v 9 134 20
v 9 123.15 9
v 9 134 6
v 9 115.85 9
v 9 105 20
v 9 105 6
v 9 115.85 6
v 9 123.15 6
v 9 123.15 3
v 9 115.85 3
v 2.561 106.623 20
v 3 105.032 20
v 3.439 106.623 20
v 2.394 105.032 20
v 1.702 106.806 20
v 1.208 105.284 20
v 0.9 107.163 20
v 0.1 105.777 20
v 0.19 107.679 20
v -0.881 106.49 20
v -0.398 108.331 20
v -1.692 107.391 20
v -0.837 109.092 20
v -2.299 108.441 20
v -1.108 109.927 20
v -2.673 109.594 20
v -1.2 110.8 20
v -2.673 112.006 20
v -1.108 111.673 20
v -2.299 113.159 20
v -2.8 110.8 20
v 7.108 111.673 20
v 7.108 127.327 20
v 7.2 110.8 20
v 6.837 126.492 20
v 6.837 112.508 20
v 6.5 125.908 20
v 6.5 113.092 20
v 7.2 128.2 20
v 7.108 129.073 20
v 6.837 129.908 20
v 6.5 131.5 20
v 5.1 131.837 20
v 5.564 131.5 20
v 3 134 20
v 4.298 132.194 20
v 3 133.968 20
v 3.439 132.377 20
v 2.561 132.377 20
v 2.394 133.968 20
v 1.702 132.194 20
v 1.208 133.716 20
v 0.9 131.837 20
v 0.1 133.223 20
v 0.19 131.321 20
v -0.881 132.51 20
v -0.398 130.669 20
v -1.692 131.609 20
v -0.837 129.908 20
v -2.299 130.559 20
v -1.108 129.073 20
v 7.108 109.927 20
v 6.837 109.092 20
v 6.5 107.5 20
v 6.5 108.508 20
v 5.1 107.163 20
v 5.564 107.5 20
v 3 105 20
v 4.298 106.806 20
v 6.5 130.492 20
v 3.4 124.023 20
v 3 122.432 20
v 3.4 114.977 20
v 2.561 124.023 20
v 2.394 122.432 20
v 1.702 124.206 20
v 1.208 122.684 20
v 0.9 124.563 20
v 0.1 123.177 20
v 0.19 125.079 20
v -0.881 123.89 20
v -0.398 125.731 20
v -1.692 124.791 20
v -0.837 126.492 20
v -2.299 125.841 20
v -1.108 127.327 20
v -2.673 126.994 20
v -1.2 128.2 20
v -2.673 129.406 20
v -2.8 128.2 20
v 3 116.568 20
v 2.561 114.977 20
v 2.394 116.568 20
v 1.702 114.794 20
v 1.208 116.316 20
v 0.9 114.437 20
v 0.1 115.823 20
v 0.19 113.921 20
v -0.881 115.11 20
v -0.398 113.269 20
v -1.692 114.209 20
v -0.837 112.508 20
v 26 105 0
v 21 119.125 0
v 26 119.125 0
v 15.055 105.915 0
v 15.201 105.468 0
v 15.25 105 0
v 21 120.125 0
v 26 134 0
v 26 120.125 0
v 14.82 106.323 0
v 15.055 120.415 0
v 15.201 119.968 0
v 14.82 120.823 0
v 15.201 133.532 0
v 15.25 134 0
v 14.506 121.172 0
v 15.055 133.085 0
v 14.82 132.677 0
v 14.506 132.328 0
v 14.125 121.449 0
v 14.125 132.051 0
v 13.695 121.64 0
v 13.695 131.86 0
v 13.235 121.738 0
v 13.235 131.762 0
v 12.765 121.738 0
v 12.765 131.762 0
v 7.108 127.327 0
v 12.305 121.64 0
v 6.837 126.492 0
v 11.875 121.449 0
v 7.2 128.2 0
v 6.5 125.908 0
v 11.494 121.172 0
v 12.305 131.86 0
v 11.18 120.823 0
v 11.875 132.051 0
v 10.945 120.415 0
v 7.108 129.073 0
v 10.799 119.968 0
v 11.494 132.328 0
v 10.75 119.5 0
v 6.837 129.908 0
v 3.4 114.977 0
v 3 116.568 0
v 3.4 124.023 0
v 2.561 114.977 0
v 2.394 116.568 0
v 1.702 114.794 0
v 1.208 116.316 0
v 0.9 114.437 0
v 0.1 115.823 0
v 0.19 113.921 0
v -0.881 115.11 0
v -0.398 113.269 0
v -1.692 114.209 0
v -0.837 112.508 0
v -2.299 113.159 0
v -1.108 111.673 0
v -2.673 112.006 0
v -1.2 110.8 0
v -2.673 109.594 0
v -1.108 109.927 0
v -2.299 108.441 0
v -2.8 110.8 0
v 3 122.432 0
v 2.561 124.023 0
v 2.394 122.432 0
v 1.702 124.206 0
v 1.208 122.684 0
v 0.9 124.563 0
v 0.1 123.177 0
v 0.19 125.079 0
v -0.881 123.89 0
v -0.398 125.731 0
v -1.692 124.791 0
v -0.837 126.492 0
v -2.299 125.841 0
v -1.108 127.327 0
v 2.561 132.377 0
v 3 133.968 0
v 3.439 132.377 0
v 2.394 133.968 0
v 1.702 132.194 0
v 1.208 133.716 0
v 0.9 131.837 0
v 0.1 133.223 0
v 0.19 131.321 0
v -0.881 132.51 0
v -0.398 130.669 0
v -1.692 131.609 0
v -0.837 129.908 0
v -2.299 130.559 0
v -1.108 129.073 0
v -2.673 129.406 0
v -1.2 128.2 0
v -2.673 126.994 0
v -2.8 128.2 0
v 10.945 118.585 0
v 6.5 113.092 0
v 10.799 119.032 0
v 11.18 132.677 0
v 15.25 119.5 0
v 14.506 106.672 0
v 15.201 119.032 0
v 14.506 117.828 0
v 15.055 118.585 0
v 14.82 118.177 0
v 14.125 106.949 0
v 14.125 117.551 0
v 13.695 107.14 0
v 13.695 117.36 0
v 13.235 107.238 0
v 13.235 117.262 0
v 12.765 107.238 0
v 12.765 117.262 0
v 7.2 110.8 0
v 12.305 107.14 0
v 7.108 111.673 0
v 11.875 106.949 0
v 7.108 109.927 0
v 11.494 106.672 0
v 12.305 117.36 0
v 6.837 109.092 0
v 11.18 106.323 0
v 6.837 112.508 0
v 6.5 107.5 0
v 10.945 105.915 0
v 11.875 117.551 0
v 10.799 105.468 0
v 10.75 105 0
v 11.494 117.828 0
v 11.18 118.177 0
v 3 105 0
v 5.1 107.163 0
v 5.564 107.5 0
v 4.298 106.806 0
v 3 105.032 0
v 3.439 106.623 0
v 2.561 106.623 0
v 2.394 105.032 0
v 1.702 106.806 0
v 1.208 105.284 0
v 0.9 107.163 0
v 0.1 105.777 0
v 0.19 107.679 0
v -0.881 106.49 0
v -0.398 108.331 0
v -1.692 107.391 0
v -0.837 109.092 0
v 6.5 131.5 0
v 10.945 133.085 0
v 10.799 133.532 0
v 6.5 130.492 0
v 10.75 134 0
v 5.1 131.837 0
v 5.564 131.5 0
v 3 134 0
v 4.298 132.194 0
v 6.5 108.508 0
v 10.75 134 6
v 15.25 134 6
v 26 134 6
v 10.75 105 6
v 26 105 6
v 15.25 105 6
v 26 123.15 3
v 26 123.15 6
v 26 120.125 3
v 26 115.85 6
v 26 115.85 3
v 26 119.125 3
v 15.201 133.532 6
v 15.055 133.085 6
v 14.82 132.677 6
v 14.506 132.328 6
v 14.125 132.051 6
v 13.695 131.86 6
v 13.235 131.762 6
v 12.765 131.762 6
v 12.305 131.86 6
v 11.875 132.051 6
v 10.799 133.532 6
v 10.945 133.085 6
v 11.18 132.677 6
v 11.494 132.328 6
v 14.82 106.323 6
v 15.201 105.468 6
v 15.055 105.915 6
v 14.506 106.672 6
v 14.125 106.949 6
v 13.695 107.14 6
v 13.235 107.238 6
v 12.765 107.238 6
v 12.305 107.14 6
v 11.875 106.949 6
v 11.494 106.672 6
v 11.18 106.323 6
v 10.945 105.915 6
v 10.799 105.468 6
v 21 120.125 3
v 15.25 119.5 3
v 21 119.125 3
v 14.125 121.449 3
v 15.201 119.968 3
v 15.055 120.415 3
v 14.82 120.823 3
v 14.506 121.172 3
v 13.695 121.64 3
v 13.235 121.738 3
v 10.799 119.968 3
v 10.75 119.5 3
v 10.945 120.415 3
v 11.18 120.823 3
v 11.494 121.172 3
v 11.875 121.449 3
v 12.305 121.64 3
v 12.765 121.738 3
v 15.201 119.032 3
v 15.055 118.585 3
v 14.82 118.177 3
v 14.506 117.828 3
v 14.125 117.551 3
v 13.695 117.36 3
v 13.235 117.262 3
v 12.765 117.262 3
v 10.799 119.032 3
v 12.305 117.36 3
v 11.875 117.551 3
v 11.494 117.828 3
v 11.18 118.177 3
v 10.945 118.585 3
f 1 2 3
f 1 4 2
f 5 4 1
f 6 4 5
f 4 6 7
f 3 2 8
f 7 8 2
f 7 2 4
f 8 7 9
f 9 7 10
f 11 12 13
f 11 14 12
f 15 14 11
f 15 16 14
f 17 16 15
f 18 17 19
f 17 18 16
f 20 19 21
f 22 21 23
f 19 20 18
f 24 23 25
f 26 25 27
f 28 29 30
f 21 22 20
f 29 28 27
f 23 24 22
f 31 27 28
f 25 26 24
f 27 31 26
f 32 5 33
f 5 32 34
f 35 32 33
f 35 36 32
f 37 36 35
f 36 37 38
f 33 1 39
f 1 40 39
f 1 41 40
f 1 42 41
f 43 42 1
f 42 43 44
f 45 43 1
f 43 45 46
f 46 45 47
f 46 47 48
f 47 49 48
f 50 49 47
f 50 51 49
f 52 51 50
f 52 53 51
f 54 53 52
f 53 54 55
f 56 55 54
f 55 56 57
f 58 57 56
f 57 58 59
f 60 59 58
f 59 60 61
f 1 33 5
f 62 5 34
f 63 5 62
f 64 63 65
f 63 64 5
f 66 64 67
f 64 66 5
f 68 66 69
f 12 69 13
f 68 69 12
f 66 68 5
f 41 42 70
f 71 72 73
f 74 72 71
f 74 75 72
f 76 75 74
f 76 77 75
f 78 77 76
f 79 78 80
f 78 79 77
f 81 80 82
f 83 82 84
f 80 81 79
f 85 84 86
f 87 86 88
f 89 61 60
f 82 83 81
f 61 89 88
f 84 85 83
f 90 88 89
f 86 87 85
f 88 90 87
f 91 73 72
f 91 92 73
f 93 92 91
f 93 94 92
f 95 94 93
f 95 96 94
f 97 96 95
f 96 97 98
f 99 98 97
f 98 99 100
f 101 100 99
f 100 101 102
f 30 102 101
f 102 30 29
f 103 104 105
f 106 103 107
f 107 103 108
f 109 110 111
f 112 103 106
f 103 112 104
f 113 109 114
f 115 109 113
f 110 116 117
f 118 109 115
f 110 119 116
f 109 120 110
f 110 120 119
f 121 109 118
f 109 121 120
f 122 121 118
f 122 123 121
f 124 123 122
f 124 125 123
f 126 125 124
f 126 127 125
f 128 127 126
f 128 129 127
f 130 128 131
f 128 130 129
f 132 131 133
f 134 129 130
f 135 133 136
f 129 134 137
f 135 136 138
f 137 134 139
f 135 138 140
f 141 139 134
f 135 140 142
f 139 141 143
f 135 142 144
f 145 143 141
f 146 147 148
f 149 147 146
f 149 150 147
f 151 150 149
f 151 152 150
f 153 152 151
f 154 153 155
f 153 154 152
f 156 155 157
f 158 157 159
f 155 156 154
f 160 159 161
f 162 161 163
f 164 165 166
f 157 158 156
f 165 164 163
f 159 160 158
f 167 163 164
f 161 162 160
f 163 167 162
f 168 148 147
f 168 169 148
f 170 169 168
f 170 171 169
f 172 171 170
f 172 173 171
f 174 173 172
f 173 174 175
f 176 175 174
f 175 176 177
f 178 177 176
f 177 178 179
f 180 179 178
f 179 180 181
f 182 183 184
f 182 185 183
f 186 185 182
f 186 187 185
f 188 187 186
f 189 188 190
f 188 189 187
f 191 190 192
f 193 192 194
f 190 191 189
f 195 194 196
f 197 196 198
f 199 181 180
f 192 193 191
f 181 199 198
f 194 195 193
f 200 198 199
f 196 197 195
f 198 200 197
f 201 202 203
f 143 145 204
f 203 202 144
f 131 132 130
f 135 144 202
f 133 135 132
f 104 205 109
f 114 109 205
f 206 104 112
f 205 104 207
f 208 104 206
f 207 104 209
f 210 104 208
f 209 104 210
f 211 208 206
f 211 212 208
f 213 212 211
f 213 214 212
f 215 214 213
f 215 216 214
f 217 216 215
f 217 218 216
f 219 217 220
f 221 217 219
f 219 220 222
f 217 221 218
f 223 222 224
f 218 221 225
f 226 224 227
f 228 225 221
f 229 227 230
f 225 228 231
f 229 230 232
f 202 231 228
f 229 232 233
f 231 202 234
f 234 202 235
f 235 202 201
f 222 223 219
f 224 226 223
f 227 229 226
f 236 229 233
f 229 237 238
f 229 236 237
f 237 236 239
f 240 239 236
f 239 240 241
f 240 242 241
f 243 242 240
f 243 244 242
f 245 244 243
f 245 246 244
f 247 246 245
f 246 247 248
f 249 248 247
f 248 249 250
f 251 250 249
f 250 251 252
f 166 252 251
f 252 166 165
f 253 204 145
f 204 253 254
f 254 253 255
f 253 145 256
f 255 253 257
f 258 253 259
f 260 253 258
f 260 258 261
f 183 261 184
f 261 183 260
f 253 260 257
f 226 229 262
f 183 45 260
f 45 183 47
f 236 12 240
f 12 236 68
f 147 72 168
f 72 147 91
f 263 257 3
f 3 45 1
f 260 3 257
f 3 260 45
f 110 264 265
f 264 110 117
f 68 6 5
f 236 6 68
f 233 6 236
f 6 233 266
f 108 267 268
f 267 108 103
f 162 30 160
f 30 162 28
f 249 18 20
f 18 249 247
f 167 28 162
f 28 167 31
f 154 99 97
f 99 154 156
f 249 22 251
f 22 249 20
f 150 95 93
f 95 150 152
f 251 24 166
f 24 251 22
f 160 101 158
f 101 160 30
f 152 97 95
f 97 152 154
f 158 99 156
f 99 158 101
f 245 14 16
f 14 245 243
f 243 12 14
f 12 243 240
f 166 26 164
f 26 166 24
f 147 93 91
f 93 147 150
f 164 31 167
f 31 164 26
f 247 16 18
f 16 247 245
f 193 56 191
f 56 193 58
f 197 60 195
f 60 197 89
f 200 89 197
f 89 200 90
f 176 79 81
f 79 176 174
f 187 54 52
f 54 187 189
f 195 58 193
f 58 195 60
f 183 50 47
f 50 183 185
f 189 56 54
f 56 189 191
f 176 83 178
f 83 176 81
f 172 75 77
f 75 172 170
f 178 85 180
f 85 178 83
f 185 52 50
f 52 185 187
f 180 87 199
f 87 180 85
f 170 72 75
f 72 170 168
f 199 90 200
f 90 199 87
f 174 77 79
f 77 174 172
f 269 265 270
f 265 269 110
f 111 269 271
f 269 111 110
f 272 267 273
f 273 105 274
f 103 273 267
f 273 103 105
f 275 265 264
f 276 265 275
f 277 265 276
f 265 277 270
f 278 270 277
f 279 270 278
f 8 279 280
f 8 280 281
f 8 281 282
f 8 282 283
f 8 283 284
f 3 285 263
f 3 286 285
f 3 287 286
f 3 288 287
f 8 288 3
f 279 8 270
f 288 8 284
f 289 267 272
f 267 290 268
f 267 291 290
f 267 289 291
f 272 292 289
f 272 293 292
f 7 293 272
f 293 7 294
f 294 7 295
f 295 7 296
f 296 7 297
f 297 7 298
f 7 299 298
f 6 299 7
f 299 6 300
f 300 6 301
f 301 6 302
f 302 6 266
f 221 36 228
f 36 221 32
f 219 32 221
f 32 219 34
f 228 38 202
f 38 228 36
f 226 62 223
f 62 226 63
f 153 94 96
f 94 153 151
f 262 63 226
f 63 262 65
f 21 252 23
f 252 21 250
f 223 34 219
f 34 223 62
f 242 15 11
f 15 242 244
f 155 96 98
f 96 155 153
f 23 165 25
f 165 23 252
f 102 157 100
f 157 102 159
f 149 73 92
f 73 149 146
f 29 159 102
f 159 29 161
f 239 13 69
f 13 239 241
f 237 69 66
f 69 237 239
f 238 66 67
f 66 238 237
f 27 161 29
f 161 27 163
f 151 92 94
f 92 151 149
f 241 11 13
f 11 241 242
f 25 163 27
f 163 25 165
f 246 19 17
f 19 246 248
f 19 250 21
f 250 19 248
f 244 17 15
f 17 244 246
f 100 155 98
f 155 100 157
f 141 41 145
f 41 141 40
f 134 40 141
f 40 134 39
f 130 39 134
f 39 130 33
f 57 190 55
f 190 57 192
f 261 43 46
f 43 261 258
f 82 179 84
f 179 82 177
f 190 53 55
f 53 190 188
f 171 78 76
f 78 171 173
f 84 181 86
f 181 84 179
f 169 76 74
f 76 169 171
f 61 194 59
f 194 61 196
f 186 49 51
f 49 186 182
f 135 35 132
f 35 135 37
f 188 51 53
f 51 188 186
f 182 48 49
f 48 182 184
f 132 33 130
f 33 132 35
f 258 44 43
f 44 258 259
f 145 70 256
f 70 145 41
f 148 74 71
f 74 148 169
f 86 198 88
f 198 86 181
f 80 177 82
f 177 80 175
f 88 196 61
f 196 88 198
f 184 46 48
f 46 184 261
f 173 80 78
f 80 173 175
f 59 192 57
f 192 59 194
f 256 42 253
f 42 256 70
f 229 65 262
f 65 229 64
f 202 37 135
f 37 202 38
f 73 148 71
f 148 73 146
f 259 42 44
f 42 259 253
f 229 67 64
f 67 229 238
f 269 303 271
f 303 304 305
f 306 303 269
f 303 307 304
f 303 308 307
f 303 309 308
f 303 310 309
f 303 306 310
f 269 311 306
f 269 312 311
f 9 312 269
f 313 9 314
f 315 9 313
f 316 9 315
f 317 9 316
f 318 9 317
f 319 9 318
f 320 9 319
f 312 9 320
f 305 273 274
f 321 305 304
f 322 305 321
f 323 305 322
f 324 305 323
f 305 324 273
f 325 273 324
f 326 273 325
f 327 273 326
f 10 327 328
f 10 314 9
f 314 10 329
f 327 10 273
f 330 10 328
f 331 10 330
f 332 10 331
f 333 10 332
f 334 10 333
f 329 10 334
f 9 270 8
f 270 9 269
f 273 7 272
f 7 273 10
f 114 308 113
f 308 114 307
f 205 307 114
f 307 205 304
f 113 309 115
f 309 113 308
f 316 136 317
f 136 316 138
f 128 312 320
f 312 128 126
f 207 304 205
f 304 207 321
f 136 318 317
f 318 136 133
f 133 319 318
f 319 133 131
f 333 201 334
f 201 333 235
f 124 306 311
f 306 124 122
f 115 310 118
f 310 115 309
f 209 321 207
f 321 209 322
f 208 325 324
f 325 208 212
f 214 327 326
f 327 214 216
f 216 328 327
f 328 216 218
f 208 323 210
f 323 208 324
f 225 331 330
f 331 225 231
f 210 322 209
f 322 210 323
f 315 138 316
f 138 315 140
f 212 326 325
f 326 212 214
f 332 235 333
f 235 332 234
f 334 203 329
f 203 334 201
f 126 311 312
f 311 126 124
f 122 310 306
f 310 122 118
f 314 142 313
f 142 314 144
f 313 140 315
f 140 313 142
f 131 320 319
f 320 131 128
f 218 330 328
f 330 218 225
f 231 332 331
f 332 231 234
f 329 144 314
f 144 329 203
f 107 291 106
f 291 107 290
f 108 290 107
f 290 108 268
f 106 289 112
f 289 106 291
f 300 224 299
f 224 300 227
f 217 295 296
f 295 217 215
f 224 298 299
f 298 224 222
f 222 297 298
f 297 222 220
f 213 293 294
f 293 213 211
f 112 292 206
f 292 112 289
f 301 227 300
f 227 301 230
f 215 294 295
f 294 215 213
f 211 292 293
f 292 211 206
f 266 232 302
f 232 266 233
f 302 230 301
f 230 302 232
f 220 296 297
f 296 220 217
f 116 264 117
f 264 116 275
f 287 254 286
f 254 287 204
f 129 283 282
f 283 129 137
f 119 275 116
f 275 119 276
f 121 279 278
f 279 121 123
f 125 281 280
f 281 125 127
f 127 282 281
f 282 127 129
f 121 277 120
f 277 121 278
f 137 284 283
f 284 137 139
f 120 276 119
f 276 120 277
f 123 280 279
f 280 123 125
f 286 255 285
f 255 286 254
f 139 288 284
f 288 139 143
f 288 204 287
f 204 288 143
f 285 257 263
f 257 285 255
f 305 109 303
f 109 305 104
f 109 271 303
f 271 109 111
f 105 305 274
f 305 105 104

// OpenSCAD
a = 6; // Gap between bars
b = 20; // width of the bars
c = 29; // Width of whole thing
e = 3; // Outside wall thickness, and 45 degree area width
f = 160; // length of bar this must be in center of
g = 4; // Slot width for cable tie
h = 20; // Slide length
i = 4.5; // Screw hole diameter
j = 6.8; // Nut width
k = 0.5; // Slot for line
d = c-e-e; // Width of slot
m = 300; // Long distance for cutouts
n = 1; // Extra bit so cutouts go through without rendering
o = 1.6; // Thickness of cylinder springs for slider

t = 0.25; // tolerance

bar = [b+t+t, c, b+t];
l = e+t+b+t+f/2-(a/2+t+b+t+e);

$fs=0.02;

//pivot();
//translate([0, 35, 0]) adjuster();
//translate([0, 70, 0]) anchor();
translate([0, 105, 0]) slider();
//translate([0, 0, 0]) bar_support();


module pivot () {
    difference() {
        // Main block
        cube([e+t+b+t+a+t+b+t+e, c, b/2+e]);
        // Slots for bars to fit in
        translate([e, 0, e]) cube(bar);
        translate([e+t+b+t+a, 0, e]) cube(bar);
        // Cutout for free-hanging line
        translate([e+t+b+t, (c-d)/2, e]) cube([a, d, b]);
        // slot for line to go through
        translate([e+t+b+t, (c-d)/2, 0]) cube([a/2, d, b]);
        translate([e+t+b+t+a/2, (c-d)/2, e]) rotate([0,135,0]) cube([b, e, b+t+e]);
        translate([e+t+b+t+a/2, (c-d)/2+d-e, e]) rotate([0,135,0]) cube([b, e, b+t+e]);
        // Cable tie slot
        translate([0,(c-g)/2,-n]) cube([g/2, g, m]);
        // Slot to fit adjustment strip
        translate([e+t+b+t+a+t+b+t+e,c/2,0]) {
            translate([-e,-1.5*e-t,-n]) cube([e,t+3*e+t,m]);
            translate([-e-t-e-t,-2.5*e-t,-n]) cube([t+e+t,t+5*e+t,m]);
        }
    }
}


module adjuster () {
    difference() {
        // Main shape
        union() {
            cube([e,c,b/2+e]);
            translate([0,e,0]) cube([l, c-2*e, e]);
            // Slot to fit adjustment strip
            translate([l,c/2,0]) {
                translate([0,-1.5*e+t,0]) cube([t+e+t,3*e-2*t,e]);
                translate([t+e+t,-2.5*e+t,0]) cube([e-2*t,5*e-2*t,e]);
            }
        }
        translate([l,c/2-g/2,0]) cube([e, g, m]);
        // slot for cable tie
        translate([0,(c-g)/2,0]) cube([g/2, g, b+t+e]);
        // Slot for screw adjuster
        translate([e+t+b,c/2,0]) {
            translate([0,-c/4-t,0]) cube([t+e+t,t+c/2+t,e]);
            translate([t+e+t,-g/2,0]) cube([g,g,e]);
        }
    }
}


module anchor () {
    difference() {
        // Main shape
        hull() {
            translate([0,e+t,0]) cube([e,c-2*e-2*t,e]);
            translate([b+10,c/2,0]) cylinder(e, r=c/2-e-t);
        }
        // Slot and hole for cable tie
        translate([0,(c-g)/2,e-g/2]) cube([b+e,g,g]);
        translate([b+e,(c-g)/2,0]) cube([g/2,g,e]);

        translate([b+10,c/2,e]) cylinder(b,r=i/2,center=true);
        cube([b+e,c/4+t,e]);
        translate([0,3*c/4-t,0]) cube([b+e,c/4+t,e]);
    }
}

module slider() {
    difference() {
        // Main shape
        union() {
            translate([e,0,0]) cube([2*e,c,b]);
            translate([e,c/5,0]) cylinder(b,r=c/5,center=false);
            translate([e,4*c/5,0]) cylinder(b,r=c/5,center=false);
            translate([2*e,0,0]) cube([b,c,2*e]);
            // Slot to fit adjustment strip
        }
        // Hollow out the cylinders
        translate([e,c/5,0]) cylinder(b,r=c/5-o,center=false);
        translate([e,4*c/5,0]) cylinder(b,r=c/5-o,center=false);
        // slot for slider
        translate([e+0.4,e-2*t,0]) cube([t+e+t-0.4,c-2*e+4*t,b]);

        // Bolt and nut capture
        translate([3*e,(c-j)/2-t,e]) cube([b,j+2*t,2*e]);
        translate([e+10,c/2,e]) cylinder(b,r=i/2,center=true);
        // Line guides
        translate([e+10,0,e]) cylinder(b,r=i/2,center=true);
        translate([e+10,c,e]) cylinder(b,r=i/2,center=true);
        // Line capture slot
        translate([2*e+10+5,(c-k-t)/2,0]) cube([b,k+2*t,b]);
    }
}


module bar_support () {
    support_l = 2*b+4*t+a+2*e;
    difference() {
        // Main block
        cube([e+2*t+b+c,support_l, b/2+e]);
        // Bar cutouts
        translate([e,0,e]) cube([b+2*t,m,b]);
        translate([e,e,e]) cube([m,b+2*t,b]);
        translate([e,e+b+2*t+a,e]) cube([m,b+2*t,b]);
        translate([2*e+2*t+b,e+b+2*t+a/2,0]) {
            translate([0,-b/2-t,0]) cube([m,b+2*t,b]);
            translate([-g/2,-g/2,0]) cube([g,g,b]);
        }
        // Cable tie slots
        translate([-g/2,support_l/2-g/2,0]) cube([g,g,b]);
        translate([e+2*t+b+c/2-g/2,-g/2,0]) cube([g,g,b]);
        translate([e+2*t+b+c/2-g/2,support_l-g/2,0]) cube([g,g,b]);
    }
}
